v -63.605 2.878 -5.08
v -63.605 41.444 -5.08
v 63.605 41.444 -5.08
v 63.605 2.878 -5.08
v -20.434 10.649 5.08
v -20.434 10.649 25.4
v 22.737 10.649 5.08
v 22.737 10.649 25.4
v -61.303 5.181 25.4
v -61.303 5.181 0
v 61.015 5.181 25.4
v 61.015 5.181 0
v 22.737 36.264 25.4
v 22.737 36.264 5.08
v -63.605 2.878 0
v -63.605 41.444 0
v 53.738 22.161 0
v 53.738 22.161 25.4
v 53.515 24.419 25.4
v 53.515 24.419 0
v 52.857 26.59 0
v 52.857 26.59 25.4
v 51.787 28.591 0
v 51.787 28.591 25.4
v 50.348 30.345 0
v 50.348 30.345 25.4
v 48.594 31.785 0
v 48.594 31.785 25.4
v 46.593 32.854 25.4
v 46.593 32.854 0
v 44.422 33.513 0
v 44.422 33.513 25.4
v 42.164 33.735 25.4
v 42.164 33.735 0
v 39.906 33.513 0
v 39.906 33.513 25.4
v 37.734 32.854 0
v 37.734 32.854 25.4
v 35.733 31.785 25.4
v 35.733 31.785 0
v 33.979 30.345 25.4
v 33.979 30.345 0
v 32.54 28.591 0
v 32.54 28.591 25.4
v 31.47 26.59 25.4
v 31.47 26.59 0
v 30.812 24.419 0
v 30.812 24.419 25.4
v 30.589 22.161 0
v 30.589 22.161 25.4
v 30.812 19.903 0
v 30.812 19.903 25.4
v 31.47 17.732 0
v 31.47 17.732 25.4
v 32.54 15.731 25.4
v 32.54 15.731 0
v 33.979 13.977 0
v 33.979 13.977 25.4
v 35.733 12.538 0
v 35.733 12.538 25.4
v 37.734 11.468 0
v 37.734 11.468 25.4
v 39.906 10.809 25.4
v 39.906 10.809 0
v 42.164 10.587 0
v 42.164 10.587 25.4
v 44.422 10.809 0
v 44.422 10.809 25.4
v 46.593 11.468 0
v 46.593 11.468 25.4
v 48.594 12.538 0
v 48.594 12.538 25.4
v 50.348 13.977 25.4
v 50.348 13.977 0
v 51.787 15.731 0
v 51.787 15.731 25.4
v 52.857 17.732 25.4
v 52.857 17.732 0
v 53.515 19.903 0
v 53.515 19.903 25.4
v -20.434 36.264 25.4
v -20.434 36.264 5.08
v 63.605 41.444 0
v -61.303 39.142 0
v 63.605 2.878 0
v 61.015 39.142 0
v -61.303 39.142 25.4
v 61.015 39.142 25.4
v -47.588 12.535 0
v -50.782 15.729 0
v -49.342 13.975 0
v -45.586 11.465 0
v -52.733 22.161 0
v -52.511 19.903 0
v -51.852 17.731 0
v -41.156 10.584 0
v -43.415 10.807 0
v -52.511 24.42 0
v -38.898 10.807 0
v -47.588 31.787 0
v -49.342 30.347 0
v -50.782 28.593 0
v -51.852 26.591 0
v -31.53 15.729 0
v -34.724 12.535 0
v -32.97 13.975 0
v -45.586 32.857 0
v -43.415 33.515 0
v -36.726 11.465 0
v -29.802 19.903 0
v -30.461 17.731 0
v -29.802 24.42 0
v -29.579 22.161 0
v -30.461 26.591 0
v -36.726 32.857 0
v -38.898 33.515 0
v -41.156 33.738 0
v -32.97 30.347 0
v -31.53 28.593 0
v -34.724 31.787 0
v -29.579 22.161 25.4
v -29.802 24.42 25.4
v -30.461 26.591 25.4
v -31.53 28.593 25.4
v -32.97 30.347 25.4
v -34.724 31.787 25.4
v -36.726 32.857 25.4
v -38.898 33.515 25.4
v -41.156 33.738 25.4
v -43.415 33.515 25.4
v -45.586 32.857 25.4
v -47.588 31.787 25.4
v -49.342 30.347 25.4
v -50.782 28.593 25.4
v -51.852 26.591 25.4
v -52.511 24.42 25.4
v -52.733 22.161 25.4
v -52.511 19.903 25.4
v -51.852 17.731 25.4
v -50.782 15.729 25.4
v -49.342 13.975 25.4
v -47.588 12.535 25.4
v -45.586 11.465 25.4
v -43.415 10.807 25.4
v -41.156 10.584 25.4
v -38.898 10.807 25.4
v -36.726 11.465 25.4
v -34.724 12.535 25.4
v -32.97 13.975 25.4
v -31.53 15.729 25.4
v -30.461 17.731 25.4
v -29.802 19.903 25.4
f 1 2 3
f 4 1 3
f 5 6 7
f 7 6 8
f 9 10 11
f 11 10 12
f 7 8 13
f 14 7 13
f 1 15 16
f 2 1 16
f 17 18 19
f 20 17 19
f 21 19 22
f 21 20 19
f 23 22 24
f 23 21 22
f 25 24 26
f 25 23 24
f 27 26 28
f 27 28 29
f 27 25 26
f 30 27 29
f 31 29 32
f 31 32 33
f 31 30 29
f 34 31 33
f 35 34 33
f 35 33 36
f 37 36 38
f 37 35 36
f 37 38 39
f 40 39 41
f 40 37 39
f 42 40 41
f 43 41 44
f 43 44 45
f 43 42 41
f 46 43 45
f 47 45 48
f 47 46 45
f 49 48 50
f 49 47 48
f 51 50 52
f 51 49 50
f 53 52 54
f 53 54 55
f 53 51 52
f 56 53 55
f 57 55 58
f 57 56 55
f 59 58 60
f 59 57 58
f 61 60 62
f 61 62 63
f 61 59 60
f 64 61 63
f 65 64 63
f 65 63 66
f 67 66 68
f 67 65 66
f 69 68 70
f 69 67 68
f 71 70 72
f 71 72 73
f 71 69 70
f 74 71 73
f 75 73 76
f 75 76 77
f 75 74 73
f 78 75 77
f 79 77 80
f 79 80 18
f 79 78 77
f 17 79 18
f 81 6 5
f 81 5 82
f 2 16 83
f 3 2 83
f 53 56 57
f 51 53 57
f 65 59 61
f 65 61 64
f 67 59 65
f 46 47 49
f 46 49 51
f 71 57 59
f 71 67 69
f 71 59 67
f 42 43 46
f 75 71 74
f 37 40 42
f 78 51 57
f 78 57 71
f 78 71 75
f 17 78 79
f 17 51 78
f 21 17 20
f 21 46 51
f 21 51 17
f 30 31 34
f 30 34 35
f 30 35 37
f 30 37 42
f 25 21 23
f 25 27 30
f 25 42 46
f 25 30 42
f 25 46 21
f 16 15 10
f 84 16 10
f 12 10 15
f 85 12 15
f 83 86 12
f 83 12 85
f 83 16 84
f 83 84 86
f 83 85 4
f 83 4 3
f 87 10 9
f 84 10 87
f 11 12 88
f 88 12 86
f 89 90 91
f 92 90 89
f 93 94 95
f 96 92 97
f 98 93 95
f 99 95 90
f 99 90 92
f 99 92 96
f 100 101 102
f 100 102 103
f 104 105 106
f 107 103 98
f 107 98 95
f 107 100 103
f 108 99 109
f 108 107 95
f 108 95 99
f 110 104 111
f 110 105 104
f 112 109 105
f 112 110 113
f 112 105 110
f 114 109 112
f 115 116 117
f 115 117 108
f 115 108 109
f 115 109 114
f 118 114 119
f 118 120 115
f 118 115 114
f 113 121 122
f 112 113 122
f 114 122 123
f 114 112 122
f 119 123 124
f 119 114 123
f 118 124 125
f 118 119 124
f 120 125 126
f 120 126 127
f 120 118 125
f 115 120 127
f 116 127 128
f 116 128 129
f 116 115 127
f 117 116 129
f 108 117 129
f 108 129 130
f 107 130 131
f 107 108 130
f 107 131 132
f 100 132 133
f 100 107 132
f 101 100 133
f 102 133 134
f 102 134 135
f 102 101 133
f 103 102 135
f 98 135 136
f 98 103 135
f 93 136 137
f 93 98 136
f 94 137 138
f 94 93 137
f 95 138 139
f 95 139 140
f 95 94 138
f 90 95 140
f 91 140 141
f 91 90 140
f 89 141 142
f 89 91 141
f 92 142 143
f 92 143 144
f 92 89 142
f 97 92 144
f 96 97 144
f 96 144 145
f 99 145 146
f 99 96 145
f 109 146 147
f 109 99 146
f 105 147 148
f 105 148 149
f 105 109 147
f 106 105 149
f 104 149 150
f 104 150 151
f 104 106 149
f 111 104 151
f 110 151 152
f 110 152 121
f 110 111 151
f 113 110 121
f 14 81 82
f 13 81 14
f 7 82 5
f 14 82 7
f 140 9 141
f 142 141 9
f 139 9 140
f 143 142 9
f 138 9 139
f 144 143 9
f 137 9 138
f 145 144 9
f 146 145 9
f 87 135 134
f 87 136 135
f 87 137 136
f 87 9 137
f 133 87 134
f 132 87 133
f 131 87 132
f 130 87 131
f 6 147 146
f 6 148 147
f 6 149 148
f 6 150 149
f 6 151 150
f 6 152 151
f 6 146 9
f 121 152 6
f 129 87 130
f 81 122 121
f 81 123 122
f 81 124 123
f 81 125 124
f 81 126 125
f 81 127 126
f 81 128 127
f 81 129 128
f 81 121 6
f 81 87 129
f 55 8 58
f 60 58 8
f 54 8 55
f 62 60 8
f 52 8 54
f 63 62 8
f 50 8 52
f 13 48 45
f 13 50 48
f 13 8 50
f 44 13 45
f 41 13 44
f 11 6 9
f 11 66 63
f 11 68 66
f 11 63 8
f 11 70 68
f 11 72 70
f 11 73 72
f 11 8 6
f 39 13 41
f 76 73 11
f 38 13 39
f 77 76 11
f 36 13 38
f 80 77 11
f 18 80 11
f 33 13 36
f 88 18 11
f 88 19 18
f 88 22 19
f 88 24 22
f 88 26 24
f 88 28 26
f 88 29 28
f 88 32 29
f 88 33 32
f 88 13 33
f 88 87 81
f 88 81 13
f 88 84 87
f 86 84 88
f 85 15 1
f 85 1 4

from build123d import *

# Parameters (mm, degrees)
F0_W     = 127.210148
F0_H     = 38.565968
F1_DEPTH = 5.08
F2_W     = 122.317444
F2_H     = 33.961081
F2_R     = 11.576806
F2_R_2   = 11.574122
F3_DEPTH = 25.4
F4_W     = 40.869429
F4_H     = 29.961394
F5_DEPTH = 22.86
F6_W     = 43.170862
F6_H     = 25.614712
F7_DEPTH = 20.32


with BuildPart() as f1:
    # F0 (on Top) → F1 (new body)
    with BuildSketch(Plane.XY):
        with Locations((4e-06, 22.161042)):
            Rectangle(F0_W, F0_H)
    extrude(amount=-F1_DEPTH)

    # F2 (on face) → F3 (join)
    with BuildSketch(Plane.XY):
        with Locations((-0.143906, 22.161044)):
            Rectangle(F2_W, F2_H)
        with Locations((-41.156225, 22.161044)):
            Circle(F2_R, mode=Mode.SUBTRACT)
        with Locations((42.16354, 22.161044)):
            Circle(F2_R_2, mode=Mode.SUBTRACT)
    extrude(amount=F3_DEPTH)

    # F4 (on face) → F5 (join)
    with BuildSketch(Plane.XY.offset(25.4)):
        with Locations((0.288312, 22.15811)):
            Rectangle(F4_W, F4_H)
    extrude(amount=-F5_DEPTH)

    # F6 (on face) → F7 (cut)
    with BuildSketch(Plane.XY.offset(25.4)):
        with Locations((1.151221, 23.456169)):
            Rectangle(F6_W, F6_H)
    extrude(amount=-F7_DEPTH, mode=Mode.SUBTRACT)


solid = f1.part
